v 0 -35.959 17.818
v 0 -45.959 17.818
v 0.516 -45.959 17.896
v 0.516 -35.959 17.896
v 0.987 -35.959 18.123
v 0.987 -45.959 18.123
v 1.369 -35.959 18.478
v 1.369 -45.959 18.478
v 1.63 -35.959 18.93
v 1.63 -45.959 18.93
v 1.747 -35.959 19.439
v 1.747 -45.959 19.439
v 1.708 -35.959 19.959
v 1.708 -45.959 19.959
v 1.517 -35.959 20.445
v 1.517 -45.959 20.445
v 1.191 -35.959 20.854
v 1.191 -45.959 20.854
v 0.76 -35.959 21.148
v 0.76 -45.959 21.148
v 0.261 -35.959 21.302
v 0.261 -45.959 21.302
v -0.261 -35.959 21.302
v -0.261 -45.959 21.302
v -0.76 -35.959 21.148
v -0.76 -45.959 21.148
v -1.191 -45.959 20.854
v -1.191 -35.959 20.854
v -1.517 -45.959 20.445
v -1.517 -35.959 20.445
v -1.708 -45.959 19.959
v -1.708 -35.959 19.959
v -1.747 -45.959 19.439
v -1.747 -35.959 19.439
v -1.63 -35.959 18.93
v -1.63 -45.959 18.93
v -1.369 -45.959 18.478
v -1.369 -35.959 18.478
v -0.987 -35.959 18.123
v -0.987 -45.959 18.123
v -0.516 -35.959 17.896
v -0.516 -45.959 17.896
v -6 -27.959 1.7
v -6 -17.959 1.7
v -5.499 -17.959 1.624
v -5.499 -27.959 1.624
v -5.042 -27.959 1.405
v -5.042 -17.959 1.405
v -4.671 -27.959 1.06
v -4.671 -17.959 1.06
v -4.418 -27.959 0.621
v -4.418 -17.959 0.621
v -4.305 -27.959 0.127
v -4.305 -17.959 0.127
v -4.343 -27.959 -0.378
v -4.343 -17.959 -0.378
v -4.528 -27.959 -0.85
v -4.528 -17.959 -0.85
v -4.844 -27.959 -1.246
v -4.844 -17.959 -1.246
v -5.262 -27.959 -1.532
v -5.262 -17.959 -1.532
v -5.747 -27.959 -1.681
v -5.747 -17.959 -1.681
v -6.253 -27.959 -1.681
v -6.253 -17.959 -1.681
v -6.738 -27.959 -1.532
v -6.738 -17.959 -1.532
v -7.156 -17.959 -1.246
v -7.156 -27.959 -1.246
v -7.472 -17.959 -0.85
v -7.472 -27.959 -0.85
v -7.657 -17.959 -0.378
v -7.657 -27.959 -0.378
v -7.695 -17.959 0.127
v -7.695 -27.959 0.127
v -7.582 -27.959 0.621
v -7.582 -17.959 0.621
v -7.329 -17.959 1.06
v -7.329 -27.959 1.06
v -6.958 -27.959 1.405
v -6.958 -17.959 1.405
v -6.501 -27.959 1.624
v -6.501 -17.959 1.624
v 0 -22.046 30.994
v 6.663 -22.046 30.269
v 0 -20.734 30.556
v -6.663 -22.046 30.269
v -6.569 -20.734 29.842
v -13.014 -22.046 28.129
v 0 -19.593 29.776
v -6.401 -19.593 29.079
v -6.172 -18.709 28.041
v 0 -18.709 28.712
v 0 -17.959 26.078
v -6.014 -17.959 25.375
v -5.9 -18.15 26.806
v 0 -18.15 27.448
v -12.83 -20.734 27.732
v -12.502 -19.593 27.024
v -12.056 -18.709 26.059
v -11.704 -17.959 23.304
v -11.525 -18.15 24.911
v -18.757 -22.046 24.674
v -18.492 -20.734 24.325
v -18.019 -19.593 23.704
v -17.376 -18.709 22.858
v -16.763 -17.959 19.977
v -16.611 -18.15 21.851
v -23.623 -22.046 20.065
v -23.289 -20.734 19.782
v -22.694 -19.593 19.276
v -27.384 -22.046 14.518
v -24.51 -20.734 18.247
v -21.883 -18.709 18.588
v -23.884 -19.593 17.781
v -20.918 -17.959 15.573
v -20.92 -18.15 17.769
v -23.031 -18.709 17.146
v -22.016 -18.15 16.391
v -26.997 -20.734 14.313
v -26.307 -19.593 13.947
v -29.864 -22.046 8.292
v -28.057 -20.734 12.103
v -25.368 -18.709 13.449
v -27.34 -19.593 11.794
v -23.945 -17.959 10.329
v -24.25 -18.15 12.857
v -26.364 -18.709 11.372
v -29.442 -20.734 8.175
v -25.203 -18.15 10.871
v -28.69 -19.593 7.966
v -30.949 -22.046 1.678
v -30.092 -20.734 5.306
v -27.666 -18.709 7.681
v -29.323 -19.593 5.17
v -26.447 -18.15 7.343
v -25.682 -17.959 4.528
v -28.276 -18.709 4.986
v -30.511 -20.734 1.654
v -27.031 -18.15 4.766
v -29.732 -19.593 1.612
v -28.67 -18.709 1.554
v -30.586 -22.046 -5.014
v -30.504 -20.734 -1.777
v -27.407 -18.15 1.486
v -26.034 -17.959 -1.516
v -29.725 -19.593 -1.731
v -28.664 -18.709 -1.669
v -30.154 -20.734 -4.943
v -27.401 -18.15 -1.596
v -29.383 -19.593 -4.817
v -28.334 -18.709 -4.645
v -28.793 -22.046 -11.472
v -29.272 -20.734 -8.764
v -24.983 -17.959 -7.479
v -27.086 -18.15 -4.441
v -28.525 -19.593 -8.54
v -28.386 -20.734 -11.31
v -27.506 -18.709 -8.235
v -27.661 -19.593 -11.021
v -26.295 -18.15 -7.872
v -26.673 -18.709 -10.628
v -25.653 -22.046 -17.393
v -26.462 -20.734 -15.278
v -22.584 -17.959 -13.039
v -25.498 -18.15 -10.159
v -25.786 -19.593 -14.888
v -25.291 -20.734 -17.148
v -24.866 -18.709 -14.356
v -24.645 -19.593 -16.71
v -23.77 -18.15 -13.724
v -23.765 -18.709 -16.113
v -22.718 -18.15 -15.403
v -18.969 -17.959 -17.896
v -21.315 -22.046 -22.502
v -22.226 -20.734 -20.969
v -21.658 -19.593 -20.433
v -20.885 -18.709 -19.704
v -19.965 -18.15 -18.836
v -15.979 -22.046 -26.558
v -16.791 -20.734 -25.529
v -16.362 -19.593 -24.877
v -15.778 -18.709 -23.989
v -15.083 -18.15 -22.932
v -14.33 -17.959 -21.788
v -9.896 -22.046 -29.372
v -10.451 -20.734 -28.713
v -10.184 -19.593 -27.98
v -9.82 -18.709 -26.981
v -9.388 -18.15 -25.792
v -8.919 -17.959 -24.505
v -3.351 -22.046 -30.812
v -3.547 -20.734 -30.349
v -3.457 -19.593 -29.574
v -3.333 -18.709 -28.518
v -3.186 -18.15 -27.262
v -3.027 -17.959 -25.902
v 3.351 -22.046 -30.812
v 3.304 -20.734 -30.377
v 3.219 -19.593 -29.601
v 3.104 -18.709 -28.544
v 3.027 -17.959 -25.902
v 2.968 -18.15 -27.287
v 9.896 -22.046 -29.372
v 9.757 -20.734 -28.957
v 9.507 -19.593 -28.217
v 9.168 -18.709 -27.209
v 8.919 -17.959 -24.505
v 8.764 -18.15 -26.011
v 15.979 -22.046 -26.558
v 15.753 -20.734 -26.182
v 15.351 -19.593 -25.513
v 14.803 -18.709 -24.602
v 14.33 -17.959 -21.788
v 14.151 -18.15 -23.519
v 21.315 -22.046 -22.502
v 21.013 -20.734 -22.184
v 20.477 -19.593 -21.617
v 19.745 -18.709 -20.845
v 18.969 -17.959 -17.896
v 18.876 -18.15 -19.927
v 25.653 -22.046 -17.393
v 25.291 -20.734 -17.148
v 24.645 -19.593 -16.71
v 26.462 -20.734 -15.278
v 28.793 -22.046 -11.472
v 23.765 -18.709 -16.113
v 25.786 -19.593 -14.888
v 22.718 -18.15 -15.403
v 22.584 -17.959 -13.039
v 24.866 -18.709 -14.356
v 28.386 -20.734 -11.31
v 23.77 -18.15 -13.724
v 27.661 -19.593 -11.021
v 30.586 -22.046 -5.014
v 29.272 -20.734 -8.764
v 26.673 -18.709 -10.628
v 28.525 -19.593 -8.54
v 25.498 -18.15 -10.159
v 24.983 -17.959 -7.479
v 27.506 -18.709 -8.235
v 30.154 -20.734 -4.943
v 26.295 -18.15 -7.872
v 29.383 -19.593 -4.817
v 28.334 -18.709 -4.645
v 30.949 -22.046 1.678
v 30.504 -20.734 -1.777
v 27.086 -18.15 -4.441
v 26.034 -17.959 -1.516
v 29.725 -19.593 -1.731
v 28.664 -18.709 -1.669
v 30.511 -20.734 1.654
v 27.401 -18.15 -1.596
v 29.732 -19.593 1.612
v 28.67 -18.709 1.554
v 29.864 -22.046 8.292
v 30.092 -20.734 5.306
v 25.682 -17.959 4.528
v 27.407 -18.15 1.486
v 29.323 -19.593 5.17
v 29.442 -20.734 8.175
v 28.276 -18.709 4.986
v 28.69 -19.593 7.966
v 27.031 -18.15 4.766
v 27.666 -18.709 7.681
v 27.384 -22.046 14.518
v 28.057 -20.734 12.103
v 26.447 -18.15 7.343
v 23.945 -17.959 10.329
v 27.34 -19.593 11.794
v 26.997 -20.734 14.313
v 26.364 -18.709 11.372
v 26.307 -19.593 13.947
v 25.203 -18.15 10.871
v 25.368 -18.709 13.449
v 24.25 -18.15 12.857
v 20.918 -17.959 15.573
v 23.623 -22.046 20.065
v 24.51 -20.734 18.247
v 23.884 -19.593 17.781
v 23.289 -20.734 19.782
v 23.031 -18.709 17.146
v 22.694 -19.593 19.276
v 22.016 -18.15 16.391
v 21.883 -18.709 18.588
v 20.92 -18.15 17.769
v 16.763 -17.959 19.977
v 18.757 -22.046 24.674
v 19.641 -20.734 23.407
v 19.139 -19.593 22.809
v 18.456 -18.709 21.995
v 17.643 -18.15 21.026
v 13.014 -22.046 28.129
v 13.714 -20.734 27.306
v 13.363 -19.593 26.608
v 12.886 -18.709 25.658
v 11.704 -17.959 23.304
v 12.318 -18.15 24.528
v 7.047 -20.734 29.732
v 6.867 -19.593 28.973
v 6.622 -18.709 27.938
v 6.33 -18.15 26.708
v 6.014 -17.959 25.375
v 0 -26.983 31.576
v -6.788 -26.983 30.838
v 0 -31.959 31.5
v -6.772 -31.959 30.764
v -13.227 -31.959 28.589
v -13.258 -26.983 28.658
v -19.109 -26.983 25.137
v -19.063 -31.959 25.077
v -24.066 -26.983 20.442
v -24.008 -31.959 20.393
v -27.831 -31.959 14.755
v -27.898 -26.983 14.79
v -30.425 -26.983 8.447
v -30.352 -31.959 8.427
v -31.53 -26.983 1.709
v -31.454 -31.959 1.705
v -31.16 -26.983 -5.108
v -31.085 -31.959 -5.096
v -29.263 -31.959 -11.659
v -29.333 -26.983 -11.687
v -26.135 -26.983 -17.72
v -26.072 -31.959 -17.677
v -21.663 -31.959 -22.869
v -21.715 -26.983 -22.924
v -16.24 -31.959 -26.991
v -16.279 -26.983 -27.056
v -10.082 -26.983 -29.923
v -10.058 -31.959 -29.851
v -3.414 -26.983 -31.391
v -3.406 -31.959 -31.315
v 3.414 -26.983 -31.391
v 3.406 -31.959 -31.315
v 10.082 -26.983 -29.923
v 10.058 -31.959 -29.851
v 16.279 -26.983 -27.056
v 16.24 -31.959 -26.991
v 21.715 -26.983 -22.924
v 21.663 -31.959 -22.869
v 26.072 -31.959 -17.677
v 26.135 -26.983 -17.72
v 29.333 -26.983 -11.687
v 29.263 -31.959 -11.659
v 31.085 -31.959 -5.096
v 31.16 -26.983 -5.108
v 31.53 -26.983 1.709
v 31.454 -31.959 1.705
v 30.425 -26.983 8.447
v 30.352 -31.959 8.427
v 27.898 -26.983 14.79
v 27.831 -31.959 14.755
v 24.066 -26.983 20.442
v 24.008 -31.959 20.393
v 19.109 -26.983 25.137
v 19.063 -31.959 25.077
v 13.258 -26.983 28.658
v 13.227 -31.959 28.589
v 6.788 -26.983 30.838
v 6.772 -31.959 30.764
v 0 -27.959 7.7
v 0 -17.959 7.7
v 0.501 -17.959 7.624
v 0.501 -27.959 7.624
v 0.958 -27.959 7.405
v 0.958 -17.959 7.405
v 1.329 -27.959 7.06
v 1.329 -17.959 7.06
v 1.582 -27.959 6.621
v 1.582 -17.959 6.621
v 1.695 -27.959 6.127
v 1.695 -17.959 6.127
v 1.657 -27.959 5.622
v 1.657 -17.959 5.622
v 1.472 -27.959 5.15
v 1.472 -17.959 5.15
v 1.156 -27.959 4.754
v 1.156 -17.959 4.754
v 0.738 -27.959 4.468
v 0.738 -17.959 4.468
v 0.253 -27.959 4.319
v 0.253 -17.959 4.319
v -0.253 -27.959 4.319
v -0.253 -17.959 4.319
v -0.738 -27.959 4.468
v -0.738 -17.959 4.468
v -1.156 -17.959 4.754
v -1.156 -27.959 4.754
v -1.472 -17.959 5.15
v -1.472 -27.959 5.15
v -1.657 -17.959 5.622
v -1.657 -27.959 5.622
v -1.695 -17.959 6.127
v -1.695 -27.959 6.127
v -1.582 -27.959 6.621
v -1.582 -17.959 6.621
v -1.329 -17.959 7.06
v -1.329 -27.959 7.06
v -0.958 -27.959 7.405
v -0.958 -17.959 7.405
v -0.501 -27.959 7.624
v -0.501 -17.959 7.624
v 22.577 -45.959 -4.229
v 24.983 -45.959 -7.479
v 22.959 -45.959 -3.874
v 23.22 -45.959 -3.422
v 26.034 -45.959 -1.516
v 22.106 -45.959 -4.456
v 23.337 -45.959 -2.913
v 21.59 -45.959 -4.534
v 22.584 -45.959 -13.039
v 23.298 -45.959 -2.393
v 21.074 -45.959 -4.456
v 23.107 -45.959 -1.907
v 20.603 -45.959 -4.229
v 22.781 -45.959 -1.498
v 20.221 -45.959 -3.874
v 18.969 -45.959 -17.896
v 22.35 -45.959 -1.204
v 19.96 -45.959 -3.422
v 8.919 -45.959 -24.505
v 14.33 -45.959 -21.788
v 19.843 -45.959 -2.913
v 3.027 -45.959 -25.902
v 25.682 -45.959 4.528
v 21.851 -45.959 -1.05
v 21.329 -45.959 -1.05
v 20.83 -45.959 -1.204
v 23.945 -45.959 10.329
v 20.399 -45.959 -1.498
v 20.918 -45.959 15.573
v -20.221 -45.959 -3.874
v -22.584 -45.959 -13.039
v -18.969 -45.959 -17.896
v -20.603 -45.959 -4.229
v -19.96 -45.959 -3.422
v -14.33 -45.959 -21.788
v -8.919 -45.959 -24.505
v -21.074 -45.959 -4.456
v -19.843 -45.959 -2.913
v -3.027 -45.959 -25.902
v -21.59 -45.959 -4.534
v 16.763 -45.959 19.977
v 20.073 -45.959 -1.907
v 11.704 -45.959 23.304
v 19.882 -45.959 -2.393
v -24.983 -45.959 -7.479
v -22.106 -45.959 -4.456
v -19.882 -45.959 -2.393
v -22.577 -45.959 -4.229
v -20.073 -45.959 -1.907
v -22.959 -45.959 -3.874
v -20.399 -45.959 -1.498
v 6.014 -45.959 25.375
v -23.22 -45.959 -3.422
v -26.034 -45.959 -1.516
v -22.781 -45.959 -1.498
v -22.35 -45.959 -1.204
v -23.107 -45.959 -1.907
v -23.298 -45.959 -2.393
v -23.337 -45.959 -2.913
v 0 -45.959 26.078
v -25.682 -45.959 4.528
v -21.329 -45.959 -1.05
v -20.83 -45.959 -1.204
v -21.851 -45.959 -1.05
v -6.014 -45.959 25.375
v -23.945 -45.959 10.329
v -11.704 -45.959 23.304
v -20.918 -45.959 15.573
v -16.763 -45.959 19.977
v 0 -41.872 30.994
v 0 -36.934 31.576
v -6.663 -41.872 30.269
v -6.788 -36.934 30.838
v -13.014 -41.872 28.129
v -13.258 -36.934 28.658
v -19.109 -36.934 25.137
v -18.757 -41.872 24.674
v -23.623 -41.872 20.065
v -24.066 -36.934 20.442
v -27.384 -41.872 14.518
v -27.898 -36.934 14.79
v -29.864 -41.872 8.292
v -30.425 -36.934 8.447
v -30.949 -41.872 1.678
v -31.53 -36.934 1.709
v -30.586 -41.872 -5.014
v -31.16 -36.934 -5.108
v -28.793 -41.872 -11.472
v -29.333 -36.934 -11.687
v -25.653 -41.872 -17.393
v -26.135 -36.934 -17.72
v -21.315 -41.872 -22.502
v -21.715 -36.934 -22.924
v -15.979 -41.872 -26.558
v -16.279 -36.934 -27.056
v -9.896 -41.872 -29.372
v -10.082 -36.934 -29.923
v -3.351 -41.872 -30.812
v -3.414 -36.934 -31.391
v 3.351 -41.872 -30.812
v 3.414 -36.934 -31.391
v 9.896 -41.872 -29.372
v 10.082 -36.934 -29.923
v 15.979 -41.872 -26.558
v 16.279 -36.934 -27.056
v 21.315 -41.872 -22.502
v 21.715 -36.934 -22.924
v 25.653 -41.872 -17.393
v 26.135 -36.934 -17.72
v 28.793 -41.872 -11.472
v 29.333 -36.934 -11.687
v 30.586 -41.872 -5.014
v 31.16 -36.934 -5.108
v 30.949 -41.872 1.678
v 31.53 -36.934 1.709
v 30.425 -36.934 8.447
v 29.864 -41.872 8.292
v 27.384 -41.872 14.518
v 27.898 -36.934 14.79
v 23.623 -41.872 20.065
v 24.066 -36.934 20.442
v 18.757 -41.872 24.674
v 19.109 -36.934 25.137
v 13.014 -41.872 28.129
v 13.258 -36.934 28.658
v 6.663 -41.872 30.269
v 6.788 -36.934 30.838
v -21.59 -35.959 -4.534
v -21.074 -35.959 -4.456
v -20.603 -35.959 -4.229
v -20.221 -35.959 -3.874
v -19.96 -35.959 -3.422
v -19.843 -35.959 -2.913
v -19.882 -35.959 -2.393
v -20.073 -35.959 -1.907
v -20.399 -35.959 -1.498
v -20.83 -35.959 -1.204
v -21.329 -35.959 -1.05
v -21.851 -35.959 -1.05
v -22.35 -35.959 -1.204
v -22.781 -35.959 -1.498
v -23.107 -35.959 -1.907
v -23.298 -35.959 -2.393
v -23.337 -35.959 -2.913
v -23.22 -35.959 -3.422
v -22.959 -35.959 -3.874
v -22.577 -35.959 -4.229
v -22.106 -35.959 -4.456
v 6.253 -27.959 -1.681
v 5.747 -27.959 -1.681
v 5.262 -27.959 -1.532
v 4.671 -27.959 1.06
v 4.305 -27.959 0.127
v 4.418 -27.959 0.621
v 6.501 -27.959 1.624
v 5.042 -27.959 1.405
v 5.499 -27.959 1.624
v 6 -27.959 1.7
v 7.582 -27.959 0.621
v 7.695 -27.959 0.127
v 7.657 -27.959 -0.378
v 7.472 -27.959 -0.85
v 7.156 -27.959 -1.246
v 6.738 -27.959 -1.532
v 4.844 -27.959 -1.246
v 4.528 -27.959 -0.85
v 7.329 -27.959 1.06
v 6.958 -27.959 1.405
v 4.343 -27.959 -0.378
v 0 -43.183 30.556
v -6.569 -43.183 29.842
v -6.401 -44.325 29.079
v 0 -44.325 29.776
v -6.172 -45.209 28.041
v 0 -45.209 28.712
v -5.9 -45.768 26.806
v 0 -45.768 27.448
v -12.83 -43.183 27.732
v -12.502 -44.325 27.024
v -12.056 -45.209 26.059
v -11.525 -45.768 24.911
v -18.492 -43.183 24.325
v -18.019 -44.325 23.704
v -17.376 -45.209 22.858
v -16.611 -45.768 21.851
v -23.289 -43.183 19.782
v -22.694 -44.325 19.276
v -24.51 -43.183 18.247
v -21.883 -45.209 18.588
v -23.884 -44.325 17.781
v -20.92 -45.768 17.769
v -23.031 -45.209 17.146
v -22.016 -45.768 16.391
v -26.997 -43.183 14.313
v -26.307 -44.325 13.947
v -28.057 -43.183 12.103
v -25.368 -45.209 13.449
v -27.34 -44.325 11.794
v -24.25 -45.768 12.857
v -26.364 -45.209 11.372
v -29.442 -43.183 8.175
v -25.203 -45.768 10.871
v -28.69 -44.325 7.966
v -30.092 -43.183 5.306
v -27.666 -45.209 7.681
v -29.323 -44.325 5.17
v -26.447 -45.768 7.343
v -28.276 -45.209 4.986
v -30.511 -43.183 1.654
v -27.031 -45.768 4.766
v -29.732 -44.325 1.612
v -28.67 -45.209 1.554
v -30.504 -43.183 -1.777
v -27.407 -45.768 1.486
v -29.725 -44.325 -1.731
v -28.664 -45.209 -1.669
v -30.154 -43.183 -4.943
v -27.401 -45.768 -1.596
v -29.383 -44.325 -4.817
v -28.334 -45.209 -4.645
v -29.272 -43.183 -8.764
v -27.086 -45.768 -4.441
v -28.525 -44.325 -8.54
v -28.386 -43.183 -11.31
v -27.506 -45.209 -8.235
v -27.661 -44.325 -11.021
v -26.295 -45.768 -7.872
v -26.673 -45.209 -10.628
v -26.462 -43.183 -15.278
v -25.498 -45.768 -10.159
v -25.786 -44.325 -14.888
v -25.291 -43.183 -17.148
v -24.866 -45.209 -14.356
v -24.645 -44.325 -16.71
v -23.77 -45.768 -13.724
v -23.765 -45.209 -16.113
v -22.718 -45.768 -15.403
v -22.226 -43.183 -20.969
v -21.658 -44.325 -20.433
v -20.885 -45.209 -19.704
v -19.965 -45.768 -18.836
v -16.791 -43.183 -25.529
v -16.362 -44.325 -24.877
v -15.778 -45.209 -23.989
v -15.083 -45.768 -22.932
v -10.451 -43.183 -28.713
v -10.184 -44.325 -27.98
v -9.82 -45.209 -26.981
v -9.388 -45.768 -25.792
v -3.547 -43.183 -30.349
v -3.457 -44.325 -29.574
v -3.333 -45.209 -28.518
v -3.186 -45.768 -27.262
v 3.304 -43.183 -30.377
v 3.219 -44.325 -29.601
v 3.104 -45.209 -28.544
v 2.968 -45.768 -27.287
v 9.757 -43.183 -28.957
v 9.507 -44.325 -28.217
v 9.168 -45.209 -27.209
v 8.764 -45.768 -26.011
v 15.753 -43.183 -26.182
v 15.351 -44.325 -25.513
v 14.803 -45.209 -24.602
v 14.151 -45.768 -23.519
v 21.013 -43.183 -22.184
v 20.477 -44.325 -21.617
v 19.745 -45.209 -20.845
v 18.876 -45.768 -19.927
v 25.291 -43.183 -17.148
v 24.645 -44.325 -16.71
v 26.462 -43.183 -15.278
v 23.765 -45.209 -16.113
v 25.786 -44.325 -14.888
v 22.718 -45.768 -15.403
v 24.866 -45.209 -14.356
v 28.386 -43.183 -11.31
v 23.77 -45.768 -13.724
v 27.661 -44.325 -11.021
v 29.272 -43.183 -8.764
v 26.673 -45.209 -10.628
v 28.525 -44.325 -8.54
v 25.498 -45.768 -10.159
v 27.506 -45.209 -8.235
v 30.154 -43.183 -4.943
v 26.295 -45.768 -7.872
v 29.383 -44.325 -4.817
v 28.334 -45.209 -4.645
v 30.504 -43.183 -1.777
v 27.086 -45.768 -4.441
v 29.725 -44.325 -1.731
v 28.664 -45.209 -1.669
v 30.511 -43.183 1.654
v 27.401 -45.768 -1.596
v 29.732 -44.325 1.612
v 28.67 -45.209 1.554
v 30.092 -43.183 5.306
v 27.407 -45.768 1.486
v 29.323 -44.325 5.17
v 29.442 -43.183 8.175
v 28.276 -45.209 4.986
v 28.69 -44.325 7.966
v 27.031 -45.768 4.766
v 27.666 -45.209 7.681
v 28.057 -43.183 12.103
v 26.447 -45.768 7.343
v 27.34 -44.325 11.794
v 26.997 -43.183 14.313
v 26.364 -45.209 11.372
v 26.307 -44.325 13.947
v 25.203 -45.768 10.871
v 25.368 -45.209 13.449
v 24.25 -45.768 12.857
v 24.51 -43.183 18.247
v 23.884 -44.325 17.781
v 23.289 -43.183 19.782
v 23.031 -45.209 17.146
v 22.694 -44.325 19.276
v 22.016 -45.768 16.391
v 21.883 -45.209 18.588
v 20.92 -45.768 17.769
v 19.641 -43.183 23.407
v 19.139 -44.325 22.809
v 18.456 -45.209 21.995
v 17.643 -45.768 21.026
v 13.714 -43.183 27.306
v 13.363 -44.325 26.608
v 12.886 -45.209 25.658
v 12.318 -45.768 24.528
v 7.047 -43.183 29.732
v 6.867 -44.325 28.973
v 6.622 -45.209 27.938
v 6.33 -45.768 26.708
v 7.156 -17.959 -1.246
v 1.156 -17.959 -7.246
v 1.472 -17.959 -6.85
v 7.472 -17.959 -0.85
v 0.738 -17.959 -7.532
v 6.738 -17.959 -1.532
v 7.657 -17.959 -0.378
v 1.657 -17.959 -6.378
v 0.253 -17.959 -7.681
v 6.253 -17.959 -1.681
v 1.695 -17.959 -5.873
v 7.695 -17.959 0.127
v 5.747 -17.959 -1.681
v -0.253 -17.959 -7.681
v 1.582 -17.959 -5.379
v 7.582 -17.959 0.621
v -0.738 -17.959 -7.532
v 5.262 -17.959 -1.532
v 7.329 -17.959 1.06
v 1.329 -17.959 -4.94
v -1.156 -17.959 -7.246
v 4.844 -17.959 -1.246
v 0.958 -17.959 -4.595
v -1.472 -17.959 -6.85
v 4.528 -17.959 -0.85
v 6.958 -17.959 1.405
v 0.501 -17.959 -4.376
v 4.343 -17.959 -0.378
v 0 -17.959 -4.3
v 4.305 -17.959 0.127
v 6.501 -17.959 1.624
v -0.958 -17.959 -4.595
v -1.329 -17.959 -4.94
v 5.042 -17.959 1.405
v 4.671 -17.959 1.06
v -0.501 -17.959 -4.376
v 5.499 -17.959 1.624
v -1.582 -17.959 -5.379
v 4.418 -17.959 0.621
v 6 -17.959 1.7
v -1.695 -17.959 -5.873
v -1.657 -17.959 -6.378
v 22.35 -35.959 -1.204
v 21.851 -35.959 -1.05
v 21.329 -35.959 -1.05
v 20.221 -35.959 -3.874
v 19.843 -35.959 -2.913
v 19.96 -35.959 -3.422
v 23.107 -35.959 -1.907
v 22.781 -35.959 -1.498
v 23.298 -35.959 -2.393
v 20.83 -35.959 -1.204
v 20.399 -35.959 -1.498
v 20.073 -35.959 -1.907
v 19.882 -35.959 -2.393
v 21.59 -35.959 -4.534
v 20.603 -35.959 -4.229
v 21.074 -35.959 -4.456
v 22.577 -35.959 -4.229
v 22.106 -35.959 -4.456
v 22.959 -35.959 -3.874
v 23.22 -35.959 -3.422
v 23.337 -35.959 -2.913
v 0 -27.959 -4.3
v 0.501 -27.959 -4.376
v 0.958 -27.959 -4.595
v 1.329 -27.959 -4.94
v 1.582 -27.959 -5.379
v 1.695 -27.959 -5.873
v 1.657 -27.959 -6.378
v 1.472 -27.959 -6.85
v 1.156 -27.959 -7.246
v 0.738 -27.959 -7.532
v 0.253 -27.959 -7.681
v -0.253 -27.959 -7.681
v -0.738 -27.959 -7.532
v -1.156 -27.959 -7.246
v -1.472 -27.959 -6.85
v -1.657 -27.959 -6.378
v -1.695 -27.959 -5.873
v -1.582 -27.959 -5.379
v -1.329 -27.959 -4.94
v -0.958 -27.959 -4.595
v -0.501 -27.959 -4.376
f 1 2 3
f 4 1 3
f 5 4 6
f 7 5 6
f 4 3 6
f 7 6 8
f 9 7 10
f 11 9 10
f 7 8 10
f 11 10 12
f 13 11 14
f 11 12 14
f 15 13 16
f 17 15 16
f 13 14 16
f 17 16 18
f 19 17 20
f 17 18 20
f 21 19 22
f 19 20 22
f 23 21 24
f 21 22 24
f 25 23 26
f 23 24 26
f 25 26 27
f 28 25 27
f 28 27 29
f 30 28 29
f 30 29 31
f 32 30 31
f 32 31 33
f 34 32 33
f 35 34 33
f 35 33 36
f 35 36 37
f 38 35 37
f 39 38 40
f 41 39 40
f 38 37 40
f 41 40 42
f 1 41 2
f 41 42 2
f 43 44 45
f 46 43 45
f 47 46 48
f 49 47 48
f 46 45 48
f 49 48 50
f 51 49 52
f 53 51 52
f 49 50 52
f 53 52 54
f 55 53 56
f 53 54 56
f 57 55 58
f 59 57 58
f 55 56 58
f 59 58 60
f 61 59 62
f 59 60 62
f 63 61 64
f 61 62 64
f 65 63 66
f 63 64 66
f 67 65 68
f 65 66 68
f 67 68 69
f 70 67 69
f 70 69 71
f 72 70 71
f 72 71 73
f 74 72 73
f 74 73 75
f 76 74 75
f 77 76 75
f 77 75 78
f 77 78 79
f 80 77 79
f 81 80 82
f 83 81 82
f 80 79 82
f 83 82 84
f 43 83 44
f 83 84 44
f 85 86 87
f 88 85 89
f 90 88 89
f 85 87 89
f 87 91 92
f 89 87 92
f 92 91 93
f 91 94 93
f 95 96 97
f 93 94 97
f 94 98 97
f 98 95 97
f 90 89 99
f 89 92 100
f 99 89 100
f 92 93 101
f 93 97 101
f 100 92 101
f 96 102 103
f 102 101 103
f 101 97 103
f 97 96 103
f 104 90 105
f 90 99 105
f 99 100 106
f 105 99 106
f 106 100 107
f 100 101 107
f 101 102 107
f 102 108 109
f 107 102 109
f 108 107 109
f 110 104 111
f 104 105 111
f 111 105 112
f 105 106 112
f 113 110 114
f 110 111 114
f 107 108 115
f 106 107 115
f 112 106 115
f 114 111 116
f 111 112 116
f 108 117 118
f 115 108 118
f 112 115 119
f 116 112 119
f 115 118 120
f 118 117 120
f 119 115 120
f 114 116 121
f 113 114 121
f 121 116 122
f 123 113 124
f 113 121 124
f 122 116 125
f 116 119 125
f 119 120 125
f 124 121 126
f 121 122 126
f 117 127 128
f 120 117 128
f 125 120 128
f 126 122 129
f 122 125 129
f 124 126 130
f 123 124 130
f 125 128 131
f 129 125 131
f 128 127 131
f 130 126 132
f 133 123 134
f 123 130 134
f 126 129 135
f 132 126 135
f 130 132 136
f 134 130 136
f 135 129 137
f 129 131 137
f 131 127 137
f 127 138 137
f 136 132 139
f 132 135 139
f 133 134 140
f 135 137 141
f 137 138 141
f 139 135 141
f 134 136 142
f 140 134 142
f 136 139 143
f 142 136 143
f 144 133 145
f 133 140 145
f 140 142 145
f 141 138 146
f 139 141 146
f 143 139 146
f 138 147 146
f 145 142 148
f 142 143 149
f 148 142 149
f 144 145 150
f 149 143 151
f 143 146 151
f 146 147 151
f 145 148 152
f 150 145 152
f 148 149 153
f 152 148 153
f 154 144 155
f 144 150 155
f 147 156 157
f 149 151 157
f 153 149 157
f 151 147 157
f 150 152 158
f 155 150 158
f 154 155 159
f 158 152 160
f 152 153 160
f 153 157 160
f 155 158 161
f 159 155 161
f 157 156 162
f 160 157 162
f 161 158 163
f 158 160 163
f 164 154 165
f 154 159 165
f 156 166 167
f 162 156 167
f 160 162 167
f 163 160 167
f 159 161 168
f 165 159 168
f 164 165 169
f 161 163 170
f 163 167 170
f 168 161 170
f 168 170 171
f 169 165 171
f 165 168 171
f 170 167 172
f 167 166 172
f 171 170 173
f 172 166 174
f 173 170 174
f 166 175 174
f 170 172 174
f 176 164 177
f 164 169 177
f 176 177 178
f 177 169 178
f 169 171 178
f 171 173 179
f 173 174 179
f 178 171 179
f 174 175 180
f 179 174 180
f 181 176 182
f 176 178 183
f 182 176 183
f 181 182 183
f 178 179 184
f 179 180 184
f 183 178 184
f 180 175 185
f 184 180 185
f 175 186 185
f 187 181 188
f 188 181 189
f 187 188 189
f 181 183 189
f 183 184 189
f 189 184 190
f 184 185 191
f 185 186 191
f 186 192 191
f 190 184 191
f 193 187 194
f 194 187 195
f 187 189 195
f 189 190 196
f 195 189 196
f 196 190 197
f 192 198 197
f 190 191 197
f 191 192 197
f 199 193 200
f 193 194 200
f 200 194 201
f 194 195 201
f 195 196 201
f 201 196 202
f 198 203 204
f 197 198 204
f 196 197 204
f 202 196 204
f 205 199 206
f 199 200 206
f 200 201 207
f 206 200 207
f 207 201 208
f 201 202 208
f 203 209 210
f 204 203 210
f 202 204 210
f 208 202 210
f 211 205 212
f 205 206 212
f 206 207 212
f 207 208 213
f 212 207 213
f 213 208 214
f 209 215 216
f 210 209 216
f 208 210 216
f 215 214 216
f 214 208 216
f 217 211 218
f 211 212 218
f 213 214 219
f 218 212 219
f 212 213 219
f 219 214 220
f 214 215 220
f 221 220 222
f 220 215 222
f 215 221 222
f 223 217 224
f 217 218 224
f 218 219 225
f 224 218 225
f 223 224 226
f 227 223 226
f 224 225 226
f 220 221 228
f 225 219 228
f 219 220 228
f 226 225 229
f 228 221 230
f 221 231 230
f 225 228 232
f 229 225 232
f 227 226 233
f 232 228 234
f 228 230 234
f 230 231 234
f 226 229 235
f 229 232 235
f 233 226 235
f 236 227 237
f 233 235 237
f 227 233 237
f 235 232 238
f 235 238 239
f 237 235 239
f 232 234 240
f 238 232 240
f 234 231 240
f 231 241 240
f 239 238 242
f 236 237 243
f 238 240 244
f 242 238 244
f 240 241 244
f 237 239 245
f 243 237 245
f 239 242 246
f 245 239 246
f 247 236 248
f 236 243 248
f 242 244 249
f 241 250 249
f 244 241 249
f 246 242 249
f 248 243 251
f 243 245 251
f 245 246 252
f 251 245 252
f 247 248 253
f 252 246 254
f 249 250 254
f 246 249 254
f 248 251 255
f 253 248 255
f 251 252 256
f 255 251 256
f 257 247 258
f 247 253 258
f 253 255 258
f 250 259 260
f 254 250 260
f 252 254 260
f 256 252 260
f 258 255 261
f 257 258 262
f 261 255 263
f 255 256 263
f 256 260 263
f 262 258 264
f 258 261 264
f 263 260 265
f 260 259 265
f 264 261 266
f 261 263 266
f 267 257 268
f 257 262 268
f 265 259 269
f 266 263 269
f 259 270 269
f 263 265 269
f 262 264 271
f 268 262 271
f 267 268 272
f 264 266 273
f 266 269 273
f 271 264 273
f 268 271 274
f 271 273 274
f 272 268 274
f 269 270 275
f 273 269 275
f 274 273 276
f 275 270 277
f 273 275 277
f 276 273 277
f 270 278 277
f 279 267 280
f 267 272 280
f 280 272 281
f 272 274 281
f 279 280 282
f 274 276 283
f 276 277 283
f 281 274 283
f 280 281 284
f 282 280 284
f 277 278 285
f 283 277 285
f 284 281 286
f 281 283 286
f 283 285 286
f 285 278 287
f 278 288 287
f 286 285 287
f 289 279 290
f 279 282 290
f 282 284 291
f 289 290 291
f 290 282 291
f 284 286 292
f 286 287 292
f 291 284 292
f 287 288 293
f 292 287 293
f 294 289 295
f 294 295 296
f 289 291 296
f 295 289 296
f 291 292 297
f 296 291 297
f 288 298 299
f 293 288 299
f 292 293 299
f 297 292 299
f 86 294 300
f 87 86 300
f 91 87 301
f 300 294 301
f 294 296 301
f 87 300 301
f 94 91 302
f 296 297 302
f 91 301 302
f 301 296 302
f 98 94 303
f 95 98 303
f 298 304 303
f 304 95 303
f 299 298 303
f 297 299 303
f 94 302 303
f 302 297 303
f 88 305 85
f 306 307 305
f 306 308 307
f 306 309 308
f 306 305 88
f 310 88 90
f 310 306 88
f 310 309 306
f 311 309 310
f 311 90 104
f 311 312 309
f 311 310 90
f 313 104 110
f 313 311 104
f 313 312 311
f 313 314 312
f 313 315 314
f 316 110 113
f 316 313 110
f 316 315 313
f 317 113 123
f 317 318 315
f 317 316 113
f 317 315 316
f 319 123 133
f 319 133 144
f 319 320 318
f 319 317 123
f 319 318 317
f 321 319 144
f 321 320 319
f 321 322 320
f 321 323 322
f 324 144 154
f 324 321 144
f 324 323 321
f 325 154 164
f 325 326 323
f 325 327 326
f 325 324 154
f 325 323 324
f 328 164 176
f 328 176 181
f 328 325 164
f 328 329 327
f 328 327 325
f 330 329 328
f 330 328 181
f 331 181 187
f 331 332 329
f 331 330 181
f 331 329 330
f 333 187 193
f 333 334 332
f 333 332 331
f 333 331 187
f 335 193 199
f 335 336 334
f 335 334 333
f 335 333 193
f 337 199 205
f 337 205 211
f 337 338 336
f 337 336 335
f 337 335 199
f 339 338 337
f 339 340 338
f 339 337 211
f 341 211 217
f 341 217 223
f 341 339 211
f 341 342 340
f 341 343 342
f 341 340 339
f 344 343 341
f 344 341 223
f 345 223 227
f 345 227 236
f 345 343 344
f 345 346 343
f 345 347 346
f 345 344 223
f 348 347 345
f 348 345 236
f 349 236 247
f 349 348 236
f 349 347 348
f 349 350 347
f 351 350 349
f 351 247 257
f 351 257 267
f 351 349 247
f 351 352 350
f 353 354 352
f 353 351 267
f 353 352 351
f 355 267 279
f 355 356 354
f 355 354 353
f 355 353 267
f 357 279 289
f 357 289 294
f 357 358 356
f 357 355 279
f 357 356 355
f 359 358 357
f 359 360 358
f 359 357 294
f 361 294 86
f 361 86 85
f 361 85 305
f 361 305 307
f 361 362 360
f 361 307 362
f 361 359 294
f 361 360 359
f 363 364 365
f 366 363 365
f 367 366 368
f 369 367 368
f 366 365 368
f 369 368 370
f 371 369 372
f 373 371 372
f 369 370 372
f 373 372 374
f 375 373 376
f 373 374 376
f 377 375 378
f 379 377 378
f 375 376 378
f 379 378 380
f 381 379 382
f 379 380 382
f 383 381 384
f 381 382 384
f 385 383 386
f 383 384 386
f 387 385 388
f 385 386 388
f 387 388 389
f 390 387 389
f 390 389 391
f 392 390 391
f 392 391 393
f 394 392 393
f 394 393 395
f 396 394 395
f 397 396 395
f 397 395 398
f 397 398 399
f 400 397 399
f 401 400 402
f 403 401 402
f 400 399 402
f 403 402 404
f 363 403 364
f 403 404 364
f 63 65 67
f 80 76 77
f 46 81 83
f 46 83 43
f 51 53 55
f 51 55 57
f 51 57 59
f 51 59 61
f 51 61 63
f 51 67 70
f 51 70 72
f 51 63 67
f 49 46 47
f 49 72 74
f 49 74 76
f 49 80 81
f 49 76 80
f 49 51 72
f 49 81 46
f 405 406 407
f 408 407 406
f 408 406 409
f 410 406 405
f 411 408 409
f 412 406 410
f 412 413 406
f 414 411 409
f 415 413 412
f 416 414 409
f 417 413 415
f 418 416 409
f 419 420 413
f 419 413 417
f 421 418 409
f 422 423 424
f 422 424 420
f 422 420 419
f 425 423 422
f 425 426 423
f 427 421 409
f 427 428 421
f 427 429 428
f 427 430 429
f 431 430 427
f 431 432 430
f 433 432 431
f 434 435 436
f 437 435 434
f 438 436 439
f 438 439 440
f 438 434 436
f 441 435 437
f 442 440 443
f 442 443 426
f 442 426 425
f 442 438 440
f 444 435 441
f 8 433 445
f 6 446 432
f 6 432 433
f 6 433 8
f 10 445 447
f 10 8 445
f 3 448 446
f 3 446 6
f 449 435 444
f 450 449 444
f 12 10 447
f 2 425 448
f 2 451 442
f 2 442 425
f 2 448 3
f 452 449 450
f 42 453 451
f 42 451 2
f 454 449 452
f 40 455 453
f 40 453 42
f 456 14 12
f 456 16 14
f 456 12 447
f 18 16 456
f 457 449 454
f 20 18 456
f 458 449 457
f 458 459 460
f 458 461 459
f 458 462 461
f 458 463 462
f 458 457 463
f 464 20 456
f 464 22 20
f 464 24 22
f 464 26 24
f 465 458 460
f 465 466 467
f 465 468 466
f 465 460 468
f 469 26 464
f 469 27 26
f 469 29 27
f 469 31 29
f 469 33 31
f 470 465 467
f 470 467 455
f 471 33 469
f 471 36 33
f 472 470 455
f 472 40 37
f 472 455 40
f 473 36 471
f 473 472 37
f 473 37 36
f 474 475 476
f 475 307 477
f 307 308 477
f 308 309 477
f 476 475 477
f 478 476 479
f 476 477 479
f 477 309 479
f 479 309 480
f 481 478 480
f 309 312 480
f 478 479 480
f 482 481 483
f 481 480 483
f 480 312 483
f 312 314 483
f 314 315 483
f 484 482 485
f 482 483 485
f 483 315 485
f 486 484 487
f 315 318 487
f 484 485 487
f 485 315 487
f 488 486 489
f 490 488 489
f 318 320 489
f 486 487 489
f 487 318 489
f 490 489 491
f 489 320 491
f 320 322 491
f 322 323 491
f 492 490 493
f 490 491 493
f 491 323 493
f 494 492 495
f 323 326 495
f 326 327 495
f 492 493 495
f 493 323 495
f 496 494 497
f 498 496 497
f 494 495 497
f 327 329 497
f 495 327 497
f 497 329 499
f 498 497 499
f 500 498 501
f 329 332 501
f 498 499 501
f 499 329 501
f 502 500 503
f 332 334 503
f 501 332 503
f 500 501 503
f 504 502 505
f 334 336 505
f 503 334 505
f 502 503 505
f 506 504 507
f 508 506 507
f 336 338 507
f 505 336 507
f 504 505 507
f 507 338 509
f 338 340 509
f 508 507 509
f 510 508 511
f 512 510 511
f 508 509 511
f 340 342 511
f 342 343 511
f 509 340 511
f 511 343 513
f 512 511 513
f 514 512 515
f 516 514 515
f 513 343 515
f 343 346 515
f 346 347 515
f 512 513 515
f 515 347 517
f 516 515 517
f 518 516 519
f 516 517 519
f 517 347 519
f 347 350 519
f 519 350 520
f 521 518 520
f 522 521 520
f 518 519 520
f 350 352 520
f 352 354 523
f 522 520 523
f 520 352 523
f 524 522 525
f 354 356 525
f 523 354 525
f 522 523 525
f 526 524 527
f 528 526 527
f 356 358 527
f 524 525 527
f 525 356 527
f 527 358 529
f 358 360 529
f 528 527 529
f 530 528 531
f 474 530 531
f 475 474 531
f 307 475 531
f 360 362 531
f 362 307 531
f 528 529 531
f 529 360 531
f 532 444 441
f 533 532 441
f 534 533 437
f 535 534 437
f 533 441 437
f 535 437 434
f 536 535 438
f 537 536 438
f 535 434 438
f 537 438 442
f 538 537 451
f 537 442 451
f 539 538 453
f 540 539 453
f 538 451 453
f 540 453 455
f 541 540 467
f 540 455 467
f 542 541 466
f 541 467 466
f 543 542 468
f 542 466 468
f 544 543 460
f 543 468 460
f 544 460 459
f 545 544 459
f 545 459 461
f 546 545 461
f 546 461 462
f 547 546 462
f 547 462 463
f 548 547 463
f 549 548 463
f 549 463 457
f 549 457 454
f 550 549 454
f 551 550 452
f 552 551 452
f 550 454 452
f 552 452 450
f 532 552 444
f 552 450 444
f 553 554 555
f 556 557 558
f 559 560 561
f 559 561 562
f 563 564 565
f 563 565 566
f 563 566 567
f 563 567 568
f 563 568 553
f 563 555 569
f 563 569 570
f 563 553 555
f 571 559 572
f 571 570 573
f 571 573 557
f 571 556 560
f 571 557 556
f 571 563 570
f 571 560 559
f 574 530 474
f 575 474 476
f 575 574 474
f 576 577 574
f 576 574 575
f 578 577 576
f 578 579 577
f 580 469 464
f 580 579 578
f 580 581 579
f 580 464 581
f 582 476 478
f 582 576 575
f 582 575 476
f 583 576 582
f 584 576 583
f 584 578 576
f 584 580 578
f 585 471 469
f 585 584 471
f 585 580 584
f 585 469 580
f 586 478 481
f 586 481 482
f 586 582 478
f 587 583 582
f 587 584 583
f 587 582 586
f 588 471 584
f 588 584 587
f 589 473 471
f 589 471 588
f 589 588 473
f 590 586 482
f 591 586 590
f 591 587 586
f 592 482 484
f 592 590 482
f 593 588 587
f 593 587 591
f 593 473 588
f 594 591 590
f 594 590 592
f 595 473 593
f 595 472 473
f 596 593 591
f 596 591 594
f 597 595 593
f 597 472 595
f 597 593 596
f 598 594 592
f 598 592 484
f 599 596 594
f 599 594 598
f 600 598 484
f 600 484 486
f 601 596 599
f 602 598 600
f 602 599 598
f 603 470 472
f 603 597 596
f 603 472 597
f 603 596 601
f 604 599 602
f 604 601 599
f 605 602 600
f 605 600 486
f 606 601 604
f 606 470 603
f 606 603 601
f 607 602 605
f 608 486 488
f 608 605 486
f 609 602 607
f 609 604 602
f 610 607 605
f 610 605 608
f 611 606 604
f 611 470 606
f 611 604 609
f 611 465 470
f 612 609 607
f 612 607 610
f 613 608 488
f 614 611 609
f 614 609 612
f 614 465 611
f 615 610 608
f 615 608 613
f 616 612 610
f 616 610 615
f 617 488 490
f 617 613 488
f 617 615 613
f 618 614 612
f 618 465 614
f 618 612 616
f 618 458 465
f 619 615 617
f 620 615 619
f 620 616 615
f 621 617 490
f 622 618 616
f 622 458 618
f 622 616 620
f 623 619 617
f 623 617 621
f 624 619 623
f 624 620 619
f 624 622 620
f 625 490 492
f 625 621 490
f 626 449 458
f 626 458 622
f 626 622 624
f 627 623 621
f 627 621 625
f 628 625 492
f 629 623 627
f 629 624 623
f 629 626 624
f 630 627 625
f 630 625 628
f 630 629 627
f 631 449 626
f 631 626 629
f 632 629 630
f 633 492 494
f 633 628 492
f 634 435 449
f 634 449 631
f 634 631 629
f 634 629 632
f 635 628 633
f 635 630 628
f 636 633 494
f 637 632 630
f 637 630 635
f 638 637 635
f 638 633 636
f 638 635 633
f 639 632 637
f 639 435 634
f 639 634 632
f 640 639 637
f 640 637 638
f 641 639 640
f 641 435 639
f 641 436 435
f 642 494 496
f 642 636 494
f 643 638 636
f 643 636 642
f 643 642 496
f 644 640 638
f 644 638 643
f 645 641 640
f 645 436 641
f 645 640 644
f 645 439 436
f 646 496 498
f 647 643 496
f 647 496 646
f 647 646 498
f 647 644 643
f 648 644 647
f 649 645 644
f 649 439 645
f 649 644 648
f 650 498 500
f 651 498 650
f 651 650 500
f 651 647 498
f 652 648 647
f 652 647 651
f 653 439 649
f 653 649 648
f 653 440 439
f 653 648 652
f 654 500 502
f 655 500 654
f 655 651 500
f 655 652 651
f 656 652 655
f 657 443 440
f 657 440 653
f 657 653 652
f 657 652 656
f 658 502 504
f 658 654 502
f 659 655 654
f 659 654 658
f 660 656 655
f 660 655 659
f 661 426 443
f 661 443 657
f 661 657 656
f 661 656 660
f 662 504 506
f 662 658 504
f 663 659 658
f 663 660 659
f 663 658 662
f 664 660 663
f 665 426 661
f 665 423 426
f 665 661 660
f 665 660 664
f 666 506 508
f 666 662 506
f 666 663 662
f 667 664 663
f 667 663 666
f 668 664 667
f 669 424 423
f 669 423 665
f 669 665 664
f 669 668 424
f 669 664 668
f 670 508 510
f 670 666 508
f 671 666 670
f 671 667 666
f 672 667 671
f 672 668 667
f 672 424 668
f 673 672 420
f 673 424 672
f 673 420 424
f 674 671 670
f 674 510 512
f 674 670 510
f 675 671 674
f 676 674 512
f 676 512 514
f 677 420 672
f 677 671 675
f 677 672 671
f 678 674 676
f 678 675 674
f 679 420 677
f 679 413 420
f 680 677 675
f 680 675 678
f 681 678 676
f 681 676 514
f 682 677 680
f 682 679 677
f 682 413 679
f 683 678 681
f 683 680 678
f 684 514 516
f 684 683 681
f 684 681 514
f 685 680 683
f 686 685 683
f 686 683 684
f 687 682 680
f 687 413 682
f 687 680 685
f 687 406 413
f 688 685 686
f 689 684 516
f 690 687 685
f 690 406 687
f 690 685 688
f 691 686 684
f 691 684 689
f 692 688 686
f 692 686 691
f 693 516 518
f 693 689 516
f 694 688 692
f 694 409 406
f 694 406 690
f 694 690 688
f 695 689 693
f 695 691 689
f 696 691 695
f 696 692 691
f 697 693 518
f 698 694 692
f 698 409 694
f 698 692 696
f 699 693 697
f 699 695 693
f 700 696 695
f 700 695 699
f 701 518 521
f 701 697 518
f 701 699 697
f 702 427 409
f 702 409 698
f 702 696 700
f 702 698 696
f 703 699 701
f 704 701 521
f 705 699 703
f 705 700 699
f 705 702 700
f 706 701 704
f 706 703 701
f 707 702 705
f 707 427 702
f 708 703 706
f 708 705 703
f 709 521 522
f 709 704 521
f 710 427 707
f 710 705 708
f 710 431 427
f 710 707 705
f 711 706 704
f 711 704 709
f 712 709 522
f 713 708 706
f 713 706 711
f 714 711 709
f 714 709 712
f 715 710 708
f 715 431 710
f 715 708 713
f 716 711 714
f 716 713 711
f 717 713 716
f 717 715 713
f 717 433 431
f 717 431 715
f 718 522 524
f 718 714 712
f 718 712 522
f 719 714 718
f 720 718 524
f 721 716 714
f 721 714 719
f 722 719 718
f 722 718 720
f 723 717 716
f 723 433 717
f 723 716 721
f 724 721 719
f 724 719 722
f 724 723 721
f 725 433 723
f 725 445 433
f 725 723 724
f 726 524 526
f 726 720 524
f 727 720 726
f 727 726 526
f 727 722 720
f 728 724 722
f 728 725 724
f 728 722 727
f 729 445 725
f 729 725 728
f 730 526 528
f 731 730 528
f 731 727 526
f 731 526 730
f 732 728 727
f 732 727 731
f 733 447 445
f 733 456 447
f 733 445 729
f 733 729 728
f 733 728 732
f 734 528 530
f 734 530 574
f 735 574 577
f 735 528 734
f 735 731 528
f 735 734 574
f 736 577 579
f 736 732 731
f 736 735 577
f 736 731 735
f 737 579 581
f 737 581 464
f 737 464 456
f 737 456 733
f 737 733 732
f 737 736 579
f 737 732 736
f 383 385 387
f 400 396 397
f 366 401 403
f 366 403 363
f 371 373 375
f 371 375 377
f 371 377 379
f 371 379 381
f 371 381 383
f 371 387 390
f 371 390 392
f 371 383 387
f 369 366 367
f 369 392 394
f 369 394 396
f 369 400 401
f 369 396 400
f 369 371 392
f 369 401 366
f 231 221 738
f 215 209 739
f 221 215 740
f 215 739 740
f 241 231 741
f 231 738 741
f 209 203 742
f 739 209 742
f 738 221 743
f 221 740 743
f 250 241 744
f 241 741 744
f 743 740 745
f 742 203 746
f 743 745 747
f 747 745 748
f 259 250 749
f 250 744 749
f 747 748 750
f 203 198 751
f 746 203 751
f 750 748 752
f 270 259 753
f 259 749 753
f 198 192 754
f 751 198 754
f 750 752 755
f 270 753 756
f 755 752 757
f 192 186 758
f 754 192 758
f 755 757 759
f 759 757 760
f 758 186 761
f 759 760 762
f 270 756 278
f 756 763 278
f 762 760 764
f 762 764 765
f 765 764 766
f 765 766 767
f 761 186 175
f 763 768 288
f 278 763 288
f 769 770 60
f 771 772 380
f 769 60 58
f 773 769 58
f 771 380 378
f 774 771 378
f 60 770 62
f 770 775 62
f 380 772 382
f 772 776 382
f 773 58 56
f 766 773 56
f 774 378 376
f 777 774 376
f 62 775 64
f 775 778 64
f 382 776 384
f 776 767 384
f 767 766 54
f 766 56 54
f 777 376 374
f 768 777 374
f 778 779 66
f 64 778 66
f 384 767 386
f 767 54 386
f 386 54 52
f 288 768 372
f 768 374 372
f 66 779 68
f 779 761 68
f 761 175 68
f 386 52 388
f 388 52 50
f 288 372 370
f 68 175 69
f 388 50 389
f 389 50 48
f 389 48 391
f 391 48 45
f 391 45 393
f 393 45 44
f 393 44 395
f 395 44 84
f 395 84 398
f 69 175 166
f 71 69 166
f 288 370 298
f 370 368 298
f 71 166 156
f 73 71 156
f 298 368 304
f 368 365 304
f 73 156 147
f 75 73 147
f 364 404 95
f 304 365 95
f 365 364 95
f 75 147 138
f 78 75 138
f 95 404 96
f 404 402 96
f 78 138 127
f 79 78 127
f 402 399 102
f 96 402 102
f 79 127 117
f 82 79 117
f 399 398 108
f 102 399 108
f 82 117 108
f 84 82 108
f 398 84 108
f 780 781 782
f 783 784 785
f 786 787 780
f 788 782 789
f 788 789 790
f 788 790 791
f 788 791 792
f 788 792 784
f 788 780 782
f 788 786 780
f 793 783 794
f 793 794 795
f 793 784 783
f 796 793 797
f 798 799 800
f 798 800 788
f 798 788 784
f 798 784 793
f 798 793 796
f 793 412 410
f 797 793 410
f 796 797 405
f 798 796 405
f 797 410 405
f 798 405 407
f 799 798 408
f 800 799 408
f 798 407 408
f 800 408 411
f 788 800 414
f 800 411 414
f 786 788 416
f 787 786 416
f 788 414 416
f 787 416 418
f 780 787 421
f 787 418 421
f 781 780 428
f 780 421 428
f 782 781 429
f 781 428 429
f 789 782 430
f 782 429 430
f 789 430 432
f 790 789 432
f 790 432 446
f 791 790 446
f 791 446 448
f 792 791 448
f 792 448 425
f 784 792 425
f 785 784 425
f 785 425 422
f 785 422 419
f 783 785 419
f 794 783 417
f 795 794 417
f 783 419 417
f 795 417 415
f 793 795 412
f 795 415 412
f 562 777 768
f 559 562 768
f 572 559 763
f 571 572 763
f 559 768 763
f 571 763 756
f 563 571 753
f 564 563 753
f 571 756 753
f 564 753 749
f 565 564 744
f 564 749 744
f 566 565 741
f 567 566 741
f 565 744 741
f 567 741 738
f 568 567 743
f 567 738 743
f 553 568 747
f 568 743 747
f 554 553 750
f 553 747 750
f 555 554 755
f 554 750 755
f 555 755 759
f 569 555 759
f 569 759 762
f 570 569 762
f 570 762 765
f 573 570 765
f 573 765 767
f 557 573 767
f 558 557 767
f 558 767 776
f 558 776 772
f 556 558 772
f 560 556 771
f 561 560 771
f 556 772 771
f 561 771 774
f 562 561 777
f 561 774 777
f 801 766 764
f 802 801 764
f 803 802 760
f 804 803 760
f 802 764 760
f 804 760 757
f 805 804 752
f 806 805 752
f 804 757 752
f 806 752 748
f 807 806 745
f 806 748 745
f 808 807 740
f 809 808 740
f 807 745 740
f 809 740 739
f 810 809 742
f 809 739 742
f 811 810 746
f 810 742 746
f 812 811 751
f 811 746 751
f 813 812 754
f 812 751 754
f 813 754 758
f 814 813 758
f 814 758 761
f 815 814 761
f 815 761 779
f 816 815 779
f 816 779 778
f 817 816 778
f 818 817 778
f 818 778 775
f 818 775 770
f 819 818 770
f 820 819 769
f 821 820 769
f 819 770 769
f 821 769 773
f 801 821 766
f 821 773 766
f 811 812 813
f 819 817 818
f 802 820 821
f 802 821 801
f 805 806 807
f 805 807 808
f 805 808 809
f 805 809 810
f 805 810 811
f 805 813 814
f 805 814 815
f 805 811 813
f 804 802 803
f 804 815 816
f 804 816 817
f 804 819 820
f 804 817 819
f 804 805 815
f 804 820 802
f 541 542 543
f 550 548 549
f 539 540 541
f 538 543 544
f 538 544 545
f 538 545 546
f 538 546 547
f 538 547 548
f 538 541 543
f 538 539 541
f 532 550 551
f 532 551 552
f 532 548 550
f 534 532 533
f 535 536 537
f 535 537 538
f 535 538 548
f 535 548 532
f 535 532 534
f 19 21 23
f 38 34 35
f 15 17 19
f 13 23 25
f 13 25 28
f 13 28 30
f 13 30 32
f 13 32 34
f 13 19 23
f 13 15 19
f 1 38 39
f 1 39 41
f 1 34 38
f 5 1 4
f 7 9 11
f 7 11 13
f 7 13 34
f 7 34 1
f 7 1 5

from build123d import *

# Parameters (mm, degrees)
SKETCH2_R          = 1.7
CUT_EXTRUDE1_DEPTH = 10
SKETCH3_R          = 1.751440935
CUT_EXTRUDE2_DEPTH = 10


with BuildPart() as part:
    # Sketch1 → Revolve1 (revolve)
    with BuildSketch(Plane(origin=(0, 0, 0), x_dir=(0, 0, -1), z_dir=(1, 0, 0)), mode=Mode.PRIVATE) as revolve1_sk:
        with BuildLine():
            Line((0, -17.958738126), (0, -31.958738126))
            Line((0, -31.958738126), (31.5, -31.958738126))
            add(Edge.make_bspline(
                [(30.994105567, -22.045911826), (31.600004636, -25.308943196), (31.771214432, -28.644796683), (31.5, -31.958738126)],
                knots=[0.295650736, 0.295650736, 0.295650736, 0.295650736, 1, 1, 1, 1], degree=3))
            ThreePointArc((30.994105567, -22.045911826), (29.274687246, -19.113992913), (26.078136879, -17.958738126))
            Line((26.078136879, -17.958738126), (0, -17.958738126))
        make_face()
    revolve1 = revolve(revolve1_sk.sketch.rotate(Axis((0, -17.958738126, 0), (0, -1, 0)), 180), axis=Axis((0, -17.958738126, 0), (0, -1, 0)))

    # Mirror1: Revolve1 across plane
    add(revolve1.mirror(Plane(origin=(0, -31.958738126, 0), x_dir=(0, 0, 1), z_dir=(0, -1, 0))))

    # Sketch2 → Cut-Extrude1 (cut)
    with BuildSketch(Plane(origin=(0, -17.958738126, 0), x_dir=(1, 0, 0), z_dir=(0, 1, 0))):
        with Locations(Location((-6, 0, 0), (0, 0, 270))):
            Circle(SKETCH2_R)
        with Locations(Location((0, 6, 0), (0, 0, 270))):
            Circle(SKETCH2_R)
        with Locations(Location((6, 0, 0), (0, 0, 270))):
            Circle(SKETCH2_R)
        with Locations(Location((0, -6, 0), (0, 0, 270))):
            Circle(SKETCH2_R)
    extrude(amount=-CUT_EXTRUDE1_DEPTH, mode=Mode.SUBTRACT)

    # Sketch3 → Cut-Extrude2 (cut)
    with BuildSketch(Plane.XZ.offset(45.958738126)):
        with Locations(Location((-21.59, -2.782347586, 0), (0, 0, 270))):
            Circle(SKETCH3_R)
        with Locations(Location((0, 19.569652414, 0), (0, 0, 270))):
            Circle(SKETCH3_R)
        with Locations(Location((21.59, -2.782347586, 0), (0, 0, 270))):
            Circle(SKETCH3_R)
    extrude(amount=-CUT_EXTRUDE2_DEPTH, mode=Mode.SUBTRACT)


solid = part.part
